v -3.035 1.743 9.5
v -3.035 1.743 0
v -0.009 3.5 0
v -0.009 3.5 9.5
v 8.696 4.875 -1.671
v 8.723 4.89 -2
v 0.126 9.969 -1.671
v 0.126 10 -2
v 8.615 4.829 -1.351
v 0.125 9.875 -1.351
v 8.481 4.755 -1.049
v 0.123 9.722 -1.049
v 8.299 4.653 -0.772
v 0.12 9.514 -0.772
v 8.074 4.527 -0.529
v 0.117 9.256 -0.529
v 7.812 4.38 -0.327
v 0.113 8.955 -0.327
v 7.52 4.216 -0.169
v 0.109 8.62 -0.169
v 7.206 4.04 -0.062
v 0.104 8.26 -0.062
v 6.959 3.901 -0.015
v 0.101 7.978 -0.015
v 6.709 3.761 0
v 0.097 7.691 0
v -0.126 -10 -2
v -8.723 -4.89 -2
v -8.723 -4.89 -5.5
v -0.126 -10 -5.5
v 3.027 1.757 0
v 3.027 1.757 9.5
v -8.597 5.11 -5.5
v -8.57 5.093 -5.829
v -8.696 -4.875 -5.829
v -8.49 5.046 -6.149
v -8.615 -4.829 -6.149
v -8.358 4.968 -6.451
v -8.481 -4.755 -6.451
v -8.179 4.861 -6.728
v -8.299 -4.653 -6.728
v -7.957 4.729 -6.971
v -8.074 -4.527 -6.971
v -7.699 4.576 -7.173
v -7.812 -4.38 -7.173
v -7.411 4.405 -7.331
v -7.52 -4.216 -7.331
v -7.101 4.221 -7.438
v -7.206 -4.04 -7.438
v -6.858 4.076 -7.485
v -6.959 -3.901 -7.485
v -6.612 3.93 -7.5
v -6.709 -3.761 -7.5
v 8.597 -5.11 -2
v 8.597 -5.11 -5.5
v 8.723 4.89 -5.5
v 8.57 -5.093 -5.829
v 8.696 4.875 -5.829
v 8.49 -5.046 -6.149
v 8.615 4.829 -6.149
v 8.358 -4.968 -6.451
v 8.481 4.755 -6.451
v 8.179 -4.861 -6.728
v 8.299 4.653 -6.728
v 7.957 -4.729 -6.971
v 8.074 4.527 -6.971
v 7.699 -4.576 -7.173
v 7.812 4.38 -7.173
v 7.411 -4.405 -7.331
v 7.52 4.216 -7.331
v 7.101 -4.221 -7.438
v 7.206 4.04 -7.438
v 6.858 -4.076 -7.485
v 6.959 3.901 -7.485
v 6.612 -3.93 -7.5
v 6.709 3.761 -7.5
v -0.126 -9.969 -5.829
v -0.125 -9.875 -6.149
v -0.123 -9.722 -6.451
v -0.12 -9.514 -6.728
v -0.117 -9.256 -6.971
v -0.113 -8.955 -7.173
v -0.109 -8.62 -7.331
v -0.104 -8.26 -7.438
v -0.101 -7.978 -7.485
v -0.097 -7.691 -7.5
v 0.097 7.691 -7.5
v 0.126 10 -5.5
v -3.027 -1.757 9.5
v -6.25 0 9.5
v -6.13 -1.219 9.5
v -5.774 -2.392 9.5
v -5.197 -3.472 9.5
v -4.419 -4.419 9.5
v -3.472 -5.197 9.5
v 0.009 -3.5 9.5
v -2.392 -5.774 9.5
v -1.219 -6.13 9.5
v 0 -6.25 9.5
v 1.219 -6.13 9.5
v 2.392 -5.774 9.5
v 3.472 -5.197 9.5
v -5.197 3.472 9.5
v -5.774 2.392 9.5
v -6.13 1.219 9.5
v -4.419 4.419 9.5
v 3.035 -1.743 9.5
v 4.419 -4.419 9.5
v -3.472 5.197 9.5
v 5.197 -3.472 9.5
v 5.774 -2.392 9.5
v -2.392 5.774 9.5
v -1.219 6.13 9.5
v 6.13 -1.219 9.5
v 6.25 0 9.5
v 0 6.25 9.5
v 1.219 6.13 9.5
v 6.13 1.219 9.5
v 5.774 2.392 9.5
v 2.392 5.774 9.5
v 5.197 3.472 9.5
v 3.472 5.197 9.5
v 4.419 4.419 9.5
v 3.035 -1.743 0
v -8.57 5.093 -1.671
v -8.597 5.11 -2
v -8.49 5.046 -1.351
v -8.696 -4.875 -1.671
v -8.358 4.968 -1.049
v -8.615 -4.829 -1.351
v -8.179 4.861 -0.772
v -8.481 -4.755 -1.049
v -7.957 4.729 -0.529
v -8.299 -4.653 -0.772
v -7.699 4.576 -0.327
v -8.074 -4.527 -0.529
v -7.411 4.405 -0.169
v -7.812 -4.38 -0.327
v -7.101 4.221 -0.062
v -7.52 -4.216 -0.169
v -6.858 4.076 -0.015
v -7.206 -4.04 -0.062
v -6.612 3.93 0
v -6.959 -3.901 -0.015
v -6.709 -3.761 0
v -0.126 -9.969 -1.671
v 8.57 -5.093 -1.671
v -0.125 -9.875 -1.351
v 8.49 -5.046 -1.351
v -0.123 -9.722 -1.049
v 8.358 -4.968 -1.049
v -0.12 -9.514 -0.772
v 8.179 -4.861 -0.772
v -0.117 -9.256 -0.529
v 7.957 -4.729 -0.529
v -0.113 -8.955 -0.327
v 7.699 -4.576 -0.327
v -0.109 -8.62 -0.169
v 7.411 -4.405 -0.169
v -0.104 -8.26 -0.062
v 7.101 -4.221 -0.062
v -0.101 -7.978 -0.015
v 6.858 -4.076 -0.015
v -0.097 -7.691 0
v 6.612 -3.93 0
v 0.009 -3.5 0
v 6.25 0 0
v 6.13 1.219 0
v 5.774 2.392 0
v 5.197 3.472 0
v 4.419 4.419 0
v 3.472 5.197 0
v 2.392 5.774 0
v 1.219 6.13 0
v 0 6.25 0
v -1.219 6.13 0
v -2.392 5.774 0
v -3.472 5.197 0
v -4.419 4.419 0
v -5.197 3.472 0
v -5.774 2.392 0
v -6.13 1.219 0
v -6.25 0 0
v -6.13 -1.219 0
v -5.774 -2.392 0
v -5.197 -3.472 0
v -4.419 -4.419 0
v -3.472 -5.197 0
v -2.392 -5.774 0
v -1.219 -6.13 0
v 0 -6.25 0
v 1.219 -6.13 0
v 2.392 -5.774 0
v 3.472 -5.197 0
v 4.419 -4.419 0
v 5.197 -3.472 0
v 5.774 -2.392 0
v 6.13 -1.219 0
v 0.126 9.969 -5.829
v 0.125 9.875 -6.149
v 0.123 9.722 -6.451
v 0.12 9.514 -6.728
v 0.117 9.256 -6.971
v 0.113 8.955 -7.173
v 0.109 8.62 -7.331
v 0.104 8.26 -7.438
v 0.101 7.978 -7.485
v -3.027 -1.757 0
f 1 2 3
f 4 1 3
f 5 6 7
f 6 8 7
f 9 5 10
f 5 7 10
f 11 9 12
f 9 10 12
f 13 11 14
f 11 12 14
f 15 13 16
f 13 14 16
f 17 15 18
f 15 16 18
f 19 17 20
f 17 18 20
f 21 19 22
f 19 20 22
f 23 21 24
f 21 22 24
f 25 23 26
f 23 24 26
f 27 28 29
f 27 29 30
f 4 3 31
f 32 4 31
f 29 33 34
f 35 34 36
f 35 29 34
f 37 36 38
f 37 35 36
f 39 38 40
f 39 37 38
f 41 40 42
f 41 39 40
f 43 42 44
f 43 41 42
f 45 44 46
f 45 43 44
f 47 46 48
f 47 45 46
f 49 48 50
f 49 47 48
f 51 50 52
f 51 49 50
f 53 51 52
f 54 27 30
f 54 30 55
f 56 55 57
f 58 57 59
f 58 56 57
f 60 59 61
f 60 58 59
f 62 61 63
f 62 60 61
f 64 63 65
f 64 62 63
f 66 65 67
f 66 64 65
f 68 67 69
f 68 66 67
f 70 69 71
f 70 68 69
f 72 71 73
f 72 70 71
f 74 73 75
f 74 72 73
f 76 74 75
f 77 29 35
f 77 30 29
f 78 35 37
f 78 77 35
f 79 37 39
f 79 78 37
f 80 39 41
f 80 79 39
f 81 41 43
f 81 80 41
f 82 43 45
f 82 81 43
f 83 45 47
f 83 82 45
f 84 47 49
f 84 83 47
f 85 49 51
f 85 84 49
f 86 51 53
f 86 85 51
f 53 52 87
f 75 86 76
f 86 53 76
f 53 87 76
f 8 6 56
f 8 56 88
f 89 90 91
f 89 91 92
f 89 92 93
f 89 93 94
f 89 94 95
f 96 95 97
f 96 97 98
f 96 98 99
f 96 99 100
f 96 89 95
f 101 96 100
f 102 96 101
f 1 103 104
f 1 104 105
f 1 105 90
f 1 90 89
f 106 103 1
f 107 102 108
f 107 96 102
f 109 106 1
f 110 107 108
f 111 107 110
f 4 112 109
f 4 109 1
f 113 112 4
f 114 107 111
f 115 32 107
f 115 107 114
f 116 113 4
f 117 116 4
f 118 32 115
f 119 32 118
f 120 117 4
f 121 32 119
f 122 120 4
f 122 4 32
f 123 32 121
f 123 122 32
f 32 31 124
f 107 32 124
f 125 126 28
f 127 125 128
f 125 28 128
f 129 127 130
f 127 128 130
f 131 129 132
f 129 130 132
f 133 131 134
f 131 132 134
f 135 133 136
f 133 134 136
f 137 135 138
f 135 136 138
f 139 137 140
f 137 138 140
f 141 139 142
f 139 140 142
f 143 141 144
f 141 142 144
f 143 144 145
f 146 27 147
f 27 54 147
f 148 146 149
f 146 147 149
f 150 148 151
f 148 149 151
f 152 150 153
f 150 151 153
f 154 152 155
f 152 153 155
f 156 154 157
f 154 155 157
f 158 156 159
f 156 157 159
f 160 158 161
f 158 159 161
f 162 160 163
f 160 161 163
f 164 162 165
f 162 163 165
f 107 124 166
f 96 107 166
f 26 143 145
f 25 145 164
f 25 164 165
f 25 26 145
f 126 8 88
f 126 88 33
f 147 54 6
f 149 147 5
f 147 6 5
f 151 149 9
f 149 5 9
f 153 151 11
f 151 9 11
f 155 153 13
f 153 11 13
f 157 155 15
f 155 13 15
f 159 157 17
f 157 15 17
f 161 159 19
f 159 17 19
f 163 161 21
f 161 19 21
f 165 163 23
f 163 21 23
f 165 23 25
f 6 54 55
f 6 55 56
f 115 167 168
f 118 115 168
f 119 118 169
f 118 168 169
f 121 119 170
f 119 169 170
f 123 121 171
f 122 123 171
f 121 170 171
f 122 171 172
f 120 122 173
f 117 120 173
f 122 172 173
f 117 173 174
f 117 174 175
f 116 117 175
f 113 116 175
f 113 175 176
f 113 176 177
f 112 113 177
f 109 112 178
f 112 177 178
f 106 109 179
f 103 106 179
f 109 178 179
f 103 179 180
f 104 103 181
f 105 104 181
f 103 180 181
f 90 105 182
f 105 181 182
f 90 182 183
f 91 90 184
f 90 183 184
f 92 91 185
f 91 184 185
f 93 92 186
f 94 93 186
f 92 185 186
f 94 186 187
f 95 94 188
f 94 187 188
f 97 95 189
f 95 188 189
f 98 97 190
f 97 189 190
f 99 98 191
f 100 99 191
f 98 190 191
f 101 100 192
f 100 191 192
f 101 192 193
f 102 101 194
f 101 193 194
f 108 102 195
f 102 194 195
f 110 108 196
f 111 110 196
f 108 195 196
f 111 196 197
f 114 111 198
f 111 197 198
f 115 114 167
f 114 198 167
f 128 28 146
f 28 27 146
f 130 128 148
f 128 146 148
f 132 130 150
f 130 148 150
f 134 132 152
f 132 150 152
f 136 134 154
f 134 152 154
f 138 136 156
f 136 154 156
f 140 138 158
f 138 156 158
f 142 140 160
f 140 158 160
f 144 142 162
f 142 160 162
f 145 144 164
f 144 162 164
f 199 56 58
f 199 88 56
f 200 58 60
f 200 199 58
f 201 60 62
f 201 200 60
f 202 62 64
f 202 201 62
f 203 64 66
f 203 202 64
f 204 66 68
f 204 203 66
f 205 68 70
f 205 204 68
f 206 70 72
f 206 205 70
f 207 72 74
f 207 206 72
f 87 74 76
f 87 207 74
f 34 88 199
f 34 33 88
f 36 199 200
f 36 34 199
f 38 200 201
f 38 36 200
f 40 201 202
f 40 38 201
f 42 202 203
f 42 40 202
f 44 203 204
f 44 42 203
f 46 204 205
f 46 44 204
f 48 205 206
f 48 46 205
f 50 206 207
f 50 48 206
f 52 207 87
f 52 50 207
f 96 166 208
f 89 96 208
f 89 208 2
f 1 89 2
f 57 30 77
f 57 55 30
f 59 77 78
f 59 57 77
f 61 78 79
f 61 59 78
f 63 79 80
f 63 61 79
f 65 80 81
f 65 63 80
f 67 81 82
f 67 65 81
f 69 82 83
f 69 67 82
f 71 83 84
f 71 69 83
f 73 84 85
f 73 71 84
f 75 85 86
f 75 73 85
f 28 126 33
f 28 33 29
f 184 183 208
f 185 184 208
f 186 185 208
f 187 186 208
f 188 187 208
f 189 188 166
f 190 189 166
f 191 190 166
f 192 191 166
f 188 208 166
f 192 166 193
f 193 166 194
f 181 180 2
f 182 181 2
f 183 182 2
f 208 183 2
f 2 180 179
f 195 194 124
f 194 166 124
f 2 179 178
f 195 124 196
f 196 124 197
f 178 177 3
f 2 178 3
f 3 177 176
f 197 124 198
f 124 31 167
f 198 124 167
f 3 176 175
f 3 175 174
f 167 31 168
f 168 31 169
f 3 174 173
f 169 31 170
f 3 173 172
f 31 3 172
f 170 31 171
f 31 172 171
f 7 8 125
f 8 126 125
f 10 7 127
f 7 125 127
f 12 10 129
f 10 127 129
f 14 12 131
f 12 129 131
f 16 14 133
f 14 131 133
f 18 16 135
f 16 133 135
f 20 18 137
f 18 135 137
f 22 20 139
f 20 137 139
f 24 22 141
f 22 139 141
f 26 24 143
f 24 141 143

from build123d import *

# Parameters (mm, degrees)
F0_R     = 6.25
F1_DEPTH = 9.5
F3_DEPTH = 7.5
F4_R     = 2


with BuildPart() as f1:
    # F0 (on Top) → F1 (new body)
    with BuildSketch(Plane.XY):
        Circle(F0_R)
        Polygon((-3.035395013, 1.7425416164), (-0.0086121995, 3.5), (3.0267828135, 1.7574583836), (3.035395013, -1.7425416164), (0.0086121995, -3.5), (-3.0267828135, -1.7574583836), align=None, mode=Mode.SUBTRACT)
    extrude(amount=F1_DEPTH)


with BuildPart() as f3:
    # F2 (on Top) → F3 (new body)
    with BuildSketch(Plane.XY):
        Polygon((8.7234992459, 4.8904560863), (0.1264904161, 10), (-8.5970088298, 5.1095439137), (-8.7234992459, -4.8904560863), (-0.1264904161, -10), (8.5970088298, -5.1095439137), align=None)
    extrude(amount=-F3_DEPTH)

    # F4
    f4_edges = [f3.edges().sort_by_distance(p)[0] for p in [
        (4.235259, -7.554772, -7.5),
        (8.660254, -0.109544, -7.5),
        (-4.235259, 7.554772, -7.5),
        (4.424995, 7.445228, -7.5),
        (-8.660254, 0.109544, -7.5),
        (-4.424995, -7.445228, -7.5),
        (-8.660254, 0.109544, 0),
        (-4.235259, 7.554772, 0),
        (-4.424995, -7.445228, 0),
        (4.235259, -7.554772, 0),
        (4.424995, 7.445228, 0),
        (8.660254, -0.109544, 0),
    ]]
    fillet(f4_edges, radius=F4_R)


solid = Compound([f1.part, f3.part])
